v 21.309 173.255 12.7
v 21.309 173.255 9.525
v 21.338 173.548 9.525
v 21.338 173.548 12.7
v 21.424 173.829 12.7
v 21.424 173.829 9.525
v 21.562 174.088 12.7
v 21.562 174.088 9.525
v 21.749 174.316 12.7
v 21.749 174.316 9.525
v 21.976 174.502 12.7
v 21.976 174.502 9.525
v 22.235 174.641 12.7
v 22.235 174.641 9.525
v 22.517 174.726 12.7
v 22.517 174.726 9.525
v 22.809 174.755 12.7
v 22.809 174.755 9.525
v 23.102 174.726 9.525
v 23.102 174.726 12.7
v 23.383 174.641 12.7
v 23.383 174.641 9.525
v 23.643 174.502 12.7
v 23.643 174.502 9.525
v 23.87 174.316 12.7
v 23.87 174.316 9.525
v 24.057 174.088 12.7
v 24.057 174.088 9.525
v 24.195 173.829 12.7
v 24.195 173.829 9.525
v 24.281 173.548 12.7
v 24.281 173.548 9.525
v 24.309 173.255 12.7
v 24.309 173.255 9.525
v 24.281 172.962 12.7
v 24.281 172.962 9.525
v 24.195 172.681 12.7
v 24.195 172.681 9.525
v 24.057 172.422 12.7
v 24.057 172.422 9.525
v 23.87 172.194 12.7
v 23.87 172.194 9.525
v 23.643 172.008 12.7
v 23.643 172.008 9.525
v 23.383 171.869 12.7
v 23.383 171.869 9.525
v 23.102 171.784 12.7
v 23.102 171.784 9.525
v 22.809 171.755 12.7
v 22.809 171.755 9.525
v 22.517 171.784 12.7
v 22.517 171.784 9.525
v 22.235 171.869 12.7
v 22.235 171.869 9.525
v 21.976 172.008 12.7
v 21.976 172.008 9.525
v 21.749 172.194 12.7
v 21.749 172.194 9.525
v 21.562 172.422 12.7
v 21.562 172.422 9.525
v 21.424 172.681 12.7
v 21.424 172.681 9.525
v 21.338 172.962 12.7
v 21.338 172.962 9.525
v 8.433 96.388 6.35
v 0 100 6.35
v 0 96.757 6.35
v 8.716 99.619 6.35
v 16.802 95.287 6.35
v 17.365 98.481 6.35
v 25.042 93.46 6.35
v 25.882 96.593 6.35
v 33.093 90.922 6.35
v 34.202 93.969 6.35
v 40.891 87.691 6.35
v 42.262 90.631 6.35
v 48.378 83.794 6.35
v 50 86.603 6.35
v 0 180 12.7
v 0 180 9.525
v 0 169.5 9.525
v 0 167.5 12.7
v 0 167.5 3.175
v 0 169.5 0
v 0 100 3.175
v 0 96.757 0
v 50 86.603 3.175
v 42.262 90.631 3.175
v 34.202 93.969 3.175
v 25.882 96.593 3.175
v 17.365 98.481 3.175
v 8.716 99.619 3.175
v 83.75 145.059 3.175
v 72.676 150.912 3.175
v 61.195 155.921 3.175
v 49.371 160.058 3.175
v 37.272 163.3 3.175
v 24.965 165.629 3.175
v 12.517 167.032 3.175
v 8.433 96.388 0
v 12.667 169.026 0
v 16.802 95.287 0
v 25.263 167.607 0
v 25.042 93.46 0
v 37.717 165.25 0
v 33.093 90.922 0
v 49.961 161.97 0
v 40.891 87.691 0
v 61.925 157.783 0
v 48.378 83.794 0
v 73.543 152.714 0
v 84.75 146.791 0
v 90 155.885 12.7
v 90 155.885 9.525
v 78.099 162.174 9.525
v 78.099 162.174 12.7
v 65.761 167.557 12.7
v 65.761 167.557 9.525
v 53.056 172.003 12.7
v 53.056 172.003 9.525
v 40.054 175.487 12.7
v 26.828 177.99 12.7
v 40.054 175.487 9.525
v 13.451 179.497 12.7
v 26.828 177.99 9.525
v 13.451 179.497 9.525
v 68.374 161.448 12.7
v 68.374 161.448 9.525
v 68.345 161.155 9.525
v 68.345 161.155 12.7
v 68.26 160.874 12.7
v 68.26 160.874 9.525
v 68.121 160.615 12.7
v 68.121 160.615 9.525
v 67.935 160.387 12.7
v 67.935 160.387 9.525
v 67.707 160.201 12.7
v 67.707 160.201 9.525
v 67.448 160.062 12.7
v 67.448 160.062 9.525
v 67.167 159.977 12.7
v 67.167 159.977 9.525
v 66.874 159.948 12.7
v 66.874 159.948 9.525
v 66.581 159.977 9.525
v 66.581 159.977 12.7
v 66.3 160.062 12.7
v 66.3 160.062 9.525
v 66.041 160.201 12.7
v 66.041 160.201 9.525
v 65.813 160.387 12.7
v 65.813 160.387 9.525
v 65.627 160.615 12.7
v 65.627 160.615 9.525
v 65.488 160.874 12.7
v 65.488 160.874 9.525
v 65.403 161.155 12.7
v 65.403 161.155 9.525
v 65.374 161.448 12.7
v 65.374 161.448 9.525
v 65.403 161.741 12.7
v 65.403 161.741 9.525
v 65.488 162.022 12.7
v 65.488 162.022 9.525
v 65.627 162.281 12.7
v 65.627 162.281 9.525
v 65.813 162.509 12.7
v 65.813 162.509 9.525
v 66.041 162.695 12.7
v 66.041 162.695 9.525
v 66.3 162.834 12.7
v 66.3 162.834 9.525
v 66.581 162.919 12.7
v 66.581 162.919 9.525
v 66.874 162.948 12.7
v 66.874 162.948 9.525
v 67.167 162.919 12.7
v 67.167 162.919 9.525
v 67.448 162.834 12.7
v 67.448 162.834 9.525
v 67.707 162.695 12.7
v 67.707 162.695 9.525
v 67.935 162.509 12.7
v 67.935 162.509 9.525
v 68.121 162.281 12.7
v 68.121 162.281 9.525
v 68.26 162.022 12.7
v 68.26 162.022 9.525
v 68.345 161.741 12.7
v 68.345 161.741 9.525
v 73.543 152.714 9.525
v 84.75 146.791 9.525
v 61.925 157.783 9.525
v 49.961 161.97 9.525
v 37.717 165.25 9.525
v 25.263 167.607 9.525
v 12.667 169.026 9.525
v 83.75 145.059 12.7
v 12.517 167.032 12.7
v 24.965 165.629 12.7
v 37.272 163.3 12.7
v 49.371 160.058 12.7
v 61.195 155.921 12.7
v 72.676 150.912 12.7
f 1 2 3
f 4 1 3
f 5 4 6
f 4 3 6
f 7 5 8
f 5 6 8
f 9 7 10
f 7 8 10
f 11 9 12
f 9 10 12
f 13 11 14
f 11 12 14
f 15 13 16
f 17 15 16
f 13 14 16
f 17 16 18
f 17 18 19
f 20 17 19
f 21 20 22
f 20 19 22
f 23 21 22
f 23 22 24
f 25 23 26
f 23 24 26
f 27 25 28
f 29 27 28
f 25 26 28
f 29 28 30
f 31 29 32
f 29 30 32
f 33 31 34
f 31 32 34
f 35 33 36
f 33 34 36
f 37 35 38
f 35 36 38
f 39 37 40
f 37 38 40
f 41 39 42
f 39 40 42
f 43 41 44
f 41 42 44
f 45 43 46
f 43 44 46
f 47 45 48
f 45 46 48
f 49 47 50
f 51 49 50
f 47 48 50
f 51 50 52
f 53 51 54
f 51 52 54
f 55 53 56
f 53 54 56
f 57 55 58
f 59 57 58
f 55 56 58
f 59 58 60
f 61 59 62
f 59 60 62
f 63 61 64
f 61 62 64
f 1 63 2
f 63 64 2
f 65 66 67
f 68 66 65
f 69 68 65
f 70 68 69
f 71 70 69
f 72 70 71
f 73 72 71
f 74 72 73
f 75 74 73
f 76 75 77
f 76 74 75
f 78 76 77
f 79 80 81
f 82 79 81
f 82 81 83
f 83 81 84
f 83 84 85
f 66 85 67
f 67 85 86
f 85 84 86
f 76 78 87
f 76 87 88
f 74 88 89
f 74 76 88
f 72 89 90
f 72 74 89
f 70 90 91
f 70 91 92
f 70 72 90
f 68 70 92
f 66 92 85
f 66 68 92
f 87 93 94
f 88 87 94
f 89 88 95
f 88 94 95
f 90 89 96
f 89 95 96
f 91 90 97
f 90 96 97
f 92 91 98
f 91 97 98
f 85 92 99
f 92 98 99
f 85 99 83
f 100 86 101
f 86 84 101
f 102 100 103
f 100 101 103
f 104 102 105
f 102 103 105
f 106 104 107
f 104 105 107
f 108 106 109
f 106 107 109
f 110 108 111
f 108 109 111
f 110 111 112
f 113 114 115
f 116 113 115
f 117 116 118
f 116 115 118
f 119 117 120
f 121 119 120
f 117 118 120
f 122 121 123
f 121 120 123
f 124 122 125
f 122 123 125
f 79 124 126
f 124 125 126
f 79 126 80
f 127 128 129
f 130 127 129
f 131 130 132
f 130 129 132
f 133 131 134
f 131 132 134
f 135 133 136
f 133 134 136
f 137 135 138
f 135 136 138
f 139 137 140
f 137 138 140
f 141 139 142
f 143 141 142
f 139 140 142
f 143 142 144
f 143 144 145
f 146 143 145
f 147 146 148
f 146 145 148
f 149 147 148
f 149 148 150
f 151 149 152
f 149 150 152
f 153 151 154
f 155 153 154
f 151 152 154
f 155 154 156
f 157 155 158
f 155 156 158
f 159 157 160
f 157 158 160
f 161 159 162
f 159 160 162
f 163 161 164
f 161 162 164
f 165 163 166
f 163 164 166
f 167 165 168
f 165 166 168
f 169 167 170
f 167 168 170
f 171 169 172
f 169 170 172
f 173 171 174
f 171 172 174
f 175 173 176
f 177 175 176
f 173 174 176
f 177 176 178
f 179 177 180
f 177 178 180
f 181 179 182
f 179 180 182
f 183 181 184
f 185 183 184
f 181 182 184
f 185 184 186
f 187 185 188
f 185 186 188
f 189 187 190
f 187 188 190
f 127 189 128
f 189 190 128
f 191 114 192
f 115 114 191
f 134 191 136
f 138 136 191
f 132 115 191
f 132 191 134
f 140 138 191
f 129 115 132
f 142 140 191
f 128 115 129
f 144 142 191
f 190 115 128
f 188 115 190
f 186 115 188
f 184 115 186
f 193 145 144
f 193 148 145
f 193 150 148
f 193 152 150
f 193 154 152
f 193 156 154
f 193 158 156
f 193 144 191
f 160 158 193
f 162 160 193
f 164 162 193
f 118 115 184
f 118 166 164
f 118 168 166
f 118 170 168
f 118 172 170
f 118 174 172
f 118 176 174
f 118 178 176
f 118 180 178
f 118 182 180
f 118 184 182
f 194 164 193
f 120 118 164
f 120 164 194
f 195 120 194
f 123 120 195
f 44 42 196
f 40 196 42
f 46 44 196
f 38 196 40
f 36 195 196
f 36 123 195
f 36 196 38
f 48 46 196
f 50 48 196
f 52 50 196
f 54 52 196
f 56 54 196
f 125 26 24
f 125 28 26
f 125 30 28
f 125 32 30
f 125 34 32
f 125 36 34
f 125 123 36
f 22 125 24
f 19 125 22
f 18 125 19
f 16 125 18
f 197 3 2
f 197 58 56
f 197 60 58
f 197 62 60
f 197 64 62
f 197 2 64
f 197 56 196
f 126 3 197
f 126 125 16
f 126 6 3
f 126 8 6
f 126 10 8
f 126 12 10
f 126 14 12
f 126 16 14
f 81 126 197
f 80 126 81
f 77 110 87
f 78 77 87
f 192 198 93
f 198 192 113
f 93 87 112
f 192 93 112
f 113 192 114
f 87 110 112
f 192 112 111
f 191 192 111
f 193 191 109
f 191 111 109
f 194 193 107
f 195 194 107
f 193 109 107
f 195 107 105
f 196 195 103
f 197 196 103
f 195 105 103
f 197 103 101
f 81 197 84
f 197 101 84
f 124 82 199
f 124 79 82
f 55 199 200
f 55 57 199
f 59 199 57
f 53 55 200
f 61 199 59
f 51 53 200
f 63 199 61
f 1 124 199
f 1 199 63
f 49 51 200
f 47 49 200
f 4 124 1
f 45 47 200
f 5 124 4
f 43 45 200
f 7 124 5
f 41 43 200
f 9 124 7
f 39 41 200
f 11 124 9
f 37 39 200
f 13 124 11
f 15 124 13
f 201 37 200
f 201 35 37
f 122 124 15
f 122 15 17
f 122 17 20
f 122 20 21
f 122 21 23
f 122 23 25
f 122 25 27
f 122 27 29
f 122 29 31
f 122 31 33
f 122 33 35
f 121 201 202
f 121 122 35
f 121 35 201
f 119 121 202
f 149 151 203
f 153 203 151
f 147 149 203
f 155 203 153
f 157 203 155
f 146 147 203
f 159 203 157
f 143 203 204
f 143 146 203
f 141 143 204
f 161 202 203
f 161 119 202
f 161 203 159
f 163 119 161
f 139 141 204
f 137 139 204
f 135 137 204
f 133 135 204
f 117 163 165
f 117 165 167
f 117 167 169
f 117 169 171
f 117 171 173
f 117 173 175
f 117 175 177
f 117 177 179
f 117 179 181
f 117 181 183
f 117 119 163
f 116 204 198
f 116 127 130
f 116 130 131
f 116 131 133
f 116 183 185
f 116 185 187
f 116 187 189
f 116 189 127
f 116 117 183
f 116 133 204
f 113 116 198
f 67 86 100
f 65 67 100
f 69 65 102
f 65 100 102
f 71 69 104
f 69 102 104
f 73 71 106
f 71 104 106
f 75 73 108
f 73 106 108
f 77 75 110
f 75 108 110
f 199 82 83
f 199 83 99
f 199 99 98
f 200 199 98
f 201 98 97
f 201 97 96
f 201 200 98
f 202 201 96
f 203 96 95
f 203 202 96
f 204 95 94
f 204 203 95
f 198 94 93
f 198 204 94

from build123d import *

# Parameters (mm, degrees)
BOSS_EXTRUDE1_DEPTH = 12.7
CUT_EXTRUDE1_DEPTH  = 9.525
CUT_EXTRUDE2_DEPTH  = 6.35
CUT_EXTRUDE3_DEPTH  = 9.525
SKETCH5_R           = 1.5
CUT_EXTRUDE4_DEPTH  = 3.175


with BuildPart() as part:
    # Sketch1 → Boss-Extrude1 (new body)
    with BuildSketch(Plane.XY):
        with BuildLine():
            Line((48.378329117, 83.793724016), (90, 155.884572681))
            ThreePointArc((90, 155.884572681), (46.587428118, 173.866648732), (0, 180))
            Line((0, 180), (0, 96.756658234))
            ThreePointArc((0, 96.756658234), (25.042465891, 93.459755054), (48.378329117, 83.793724016))
        make_face()
    extrude(amount=BOSS_EXTRUDE1_DEPTH)

    # Sketch2 → Cut-Extrude1 (cut)
    with BuildSketch(Plane.XY.offset(12.7)):
        with BuildLine():
            Line((0, 100), (0, 167.5))
            ThreePointArc((0, 167.5), (43.352190055, 161.792575903), (83.75, 145.059255134))
            Line((83.75, 145.059255134), (50, 86.602540378))
            ThreePointArc((50, 86.602540378), (25.88190451, 96.592582629), (0, 100))
        make_face()
    extrude(amount=-CUT_EXTRUDE1_DEPTH, mode=Mode.SUBTRACT)

    # Sketch3 → Cut-Extrude2 (cut)
    with BuildSketch(Plane.XY.offset(12.7)):
        with BuildLine():
            Line((48.378329117, 83.793724016), (50, 86.602540378))
            ThreePointArc((50, 86.602540378), (25.88190451, 96.592582629), (0, 100))
            Line((0, 100), (0, 96.756658234))
            ThreePointArc((0, 96.756658234), (25.042465891, 93.459755054), (48.378329117, 83.793724016))
        make_face()
    extrude(amount=-CUT_EXTRUDE2_DEPTH, mode=Mode.SUBTRACT)

    # Sketch4 → Cut-Extrude3 (cut)
    with BuildSketch(Plane(origin=(0, 0, 0), x_dir=(-1, 0, 0), z_dir=(0, 0, -1))):
        with BuildLine():
            Line((0, 169.5), (0, 180))
            ThreePointArc((0, 180), (-46.587428118, 173.866648732), (-90, 155.884572681))
            Line((-90, 155.884572681), (-84.75, 146.791305941))
            ThreePointArc((-84.75, 146.791305941), (-43.869828145, 163.724427556), (0, 169.5))
        make_face()
    extrude(amount=-CUT_EXTRUDE3_DEPTH, mode=Mode.SUBTRACT)

    # Sketch5 → Cut-Extrude4 (cut)
    with BuildSketch(Plane(origin=(0, 0, 9.525), x_dir=(-1, 0, 0), z_dir=(0, 0, -1))):
        with Locations((-22.80945209, 173.254989525)):
            Circle(SKETCH5_R)
        with Locations(Location((-66.873929806, 161.447948306, 0), (0, 0, 180))):
            Circle(SKETCH5_R)
    extrude(amount=-CUT_EXTRUDE4_DEPTH, mode=Mode.SUBTRACT)


solid = part.part
